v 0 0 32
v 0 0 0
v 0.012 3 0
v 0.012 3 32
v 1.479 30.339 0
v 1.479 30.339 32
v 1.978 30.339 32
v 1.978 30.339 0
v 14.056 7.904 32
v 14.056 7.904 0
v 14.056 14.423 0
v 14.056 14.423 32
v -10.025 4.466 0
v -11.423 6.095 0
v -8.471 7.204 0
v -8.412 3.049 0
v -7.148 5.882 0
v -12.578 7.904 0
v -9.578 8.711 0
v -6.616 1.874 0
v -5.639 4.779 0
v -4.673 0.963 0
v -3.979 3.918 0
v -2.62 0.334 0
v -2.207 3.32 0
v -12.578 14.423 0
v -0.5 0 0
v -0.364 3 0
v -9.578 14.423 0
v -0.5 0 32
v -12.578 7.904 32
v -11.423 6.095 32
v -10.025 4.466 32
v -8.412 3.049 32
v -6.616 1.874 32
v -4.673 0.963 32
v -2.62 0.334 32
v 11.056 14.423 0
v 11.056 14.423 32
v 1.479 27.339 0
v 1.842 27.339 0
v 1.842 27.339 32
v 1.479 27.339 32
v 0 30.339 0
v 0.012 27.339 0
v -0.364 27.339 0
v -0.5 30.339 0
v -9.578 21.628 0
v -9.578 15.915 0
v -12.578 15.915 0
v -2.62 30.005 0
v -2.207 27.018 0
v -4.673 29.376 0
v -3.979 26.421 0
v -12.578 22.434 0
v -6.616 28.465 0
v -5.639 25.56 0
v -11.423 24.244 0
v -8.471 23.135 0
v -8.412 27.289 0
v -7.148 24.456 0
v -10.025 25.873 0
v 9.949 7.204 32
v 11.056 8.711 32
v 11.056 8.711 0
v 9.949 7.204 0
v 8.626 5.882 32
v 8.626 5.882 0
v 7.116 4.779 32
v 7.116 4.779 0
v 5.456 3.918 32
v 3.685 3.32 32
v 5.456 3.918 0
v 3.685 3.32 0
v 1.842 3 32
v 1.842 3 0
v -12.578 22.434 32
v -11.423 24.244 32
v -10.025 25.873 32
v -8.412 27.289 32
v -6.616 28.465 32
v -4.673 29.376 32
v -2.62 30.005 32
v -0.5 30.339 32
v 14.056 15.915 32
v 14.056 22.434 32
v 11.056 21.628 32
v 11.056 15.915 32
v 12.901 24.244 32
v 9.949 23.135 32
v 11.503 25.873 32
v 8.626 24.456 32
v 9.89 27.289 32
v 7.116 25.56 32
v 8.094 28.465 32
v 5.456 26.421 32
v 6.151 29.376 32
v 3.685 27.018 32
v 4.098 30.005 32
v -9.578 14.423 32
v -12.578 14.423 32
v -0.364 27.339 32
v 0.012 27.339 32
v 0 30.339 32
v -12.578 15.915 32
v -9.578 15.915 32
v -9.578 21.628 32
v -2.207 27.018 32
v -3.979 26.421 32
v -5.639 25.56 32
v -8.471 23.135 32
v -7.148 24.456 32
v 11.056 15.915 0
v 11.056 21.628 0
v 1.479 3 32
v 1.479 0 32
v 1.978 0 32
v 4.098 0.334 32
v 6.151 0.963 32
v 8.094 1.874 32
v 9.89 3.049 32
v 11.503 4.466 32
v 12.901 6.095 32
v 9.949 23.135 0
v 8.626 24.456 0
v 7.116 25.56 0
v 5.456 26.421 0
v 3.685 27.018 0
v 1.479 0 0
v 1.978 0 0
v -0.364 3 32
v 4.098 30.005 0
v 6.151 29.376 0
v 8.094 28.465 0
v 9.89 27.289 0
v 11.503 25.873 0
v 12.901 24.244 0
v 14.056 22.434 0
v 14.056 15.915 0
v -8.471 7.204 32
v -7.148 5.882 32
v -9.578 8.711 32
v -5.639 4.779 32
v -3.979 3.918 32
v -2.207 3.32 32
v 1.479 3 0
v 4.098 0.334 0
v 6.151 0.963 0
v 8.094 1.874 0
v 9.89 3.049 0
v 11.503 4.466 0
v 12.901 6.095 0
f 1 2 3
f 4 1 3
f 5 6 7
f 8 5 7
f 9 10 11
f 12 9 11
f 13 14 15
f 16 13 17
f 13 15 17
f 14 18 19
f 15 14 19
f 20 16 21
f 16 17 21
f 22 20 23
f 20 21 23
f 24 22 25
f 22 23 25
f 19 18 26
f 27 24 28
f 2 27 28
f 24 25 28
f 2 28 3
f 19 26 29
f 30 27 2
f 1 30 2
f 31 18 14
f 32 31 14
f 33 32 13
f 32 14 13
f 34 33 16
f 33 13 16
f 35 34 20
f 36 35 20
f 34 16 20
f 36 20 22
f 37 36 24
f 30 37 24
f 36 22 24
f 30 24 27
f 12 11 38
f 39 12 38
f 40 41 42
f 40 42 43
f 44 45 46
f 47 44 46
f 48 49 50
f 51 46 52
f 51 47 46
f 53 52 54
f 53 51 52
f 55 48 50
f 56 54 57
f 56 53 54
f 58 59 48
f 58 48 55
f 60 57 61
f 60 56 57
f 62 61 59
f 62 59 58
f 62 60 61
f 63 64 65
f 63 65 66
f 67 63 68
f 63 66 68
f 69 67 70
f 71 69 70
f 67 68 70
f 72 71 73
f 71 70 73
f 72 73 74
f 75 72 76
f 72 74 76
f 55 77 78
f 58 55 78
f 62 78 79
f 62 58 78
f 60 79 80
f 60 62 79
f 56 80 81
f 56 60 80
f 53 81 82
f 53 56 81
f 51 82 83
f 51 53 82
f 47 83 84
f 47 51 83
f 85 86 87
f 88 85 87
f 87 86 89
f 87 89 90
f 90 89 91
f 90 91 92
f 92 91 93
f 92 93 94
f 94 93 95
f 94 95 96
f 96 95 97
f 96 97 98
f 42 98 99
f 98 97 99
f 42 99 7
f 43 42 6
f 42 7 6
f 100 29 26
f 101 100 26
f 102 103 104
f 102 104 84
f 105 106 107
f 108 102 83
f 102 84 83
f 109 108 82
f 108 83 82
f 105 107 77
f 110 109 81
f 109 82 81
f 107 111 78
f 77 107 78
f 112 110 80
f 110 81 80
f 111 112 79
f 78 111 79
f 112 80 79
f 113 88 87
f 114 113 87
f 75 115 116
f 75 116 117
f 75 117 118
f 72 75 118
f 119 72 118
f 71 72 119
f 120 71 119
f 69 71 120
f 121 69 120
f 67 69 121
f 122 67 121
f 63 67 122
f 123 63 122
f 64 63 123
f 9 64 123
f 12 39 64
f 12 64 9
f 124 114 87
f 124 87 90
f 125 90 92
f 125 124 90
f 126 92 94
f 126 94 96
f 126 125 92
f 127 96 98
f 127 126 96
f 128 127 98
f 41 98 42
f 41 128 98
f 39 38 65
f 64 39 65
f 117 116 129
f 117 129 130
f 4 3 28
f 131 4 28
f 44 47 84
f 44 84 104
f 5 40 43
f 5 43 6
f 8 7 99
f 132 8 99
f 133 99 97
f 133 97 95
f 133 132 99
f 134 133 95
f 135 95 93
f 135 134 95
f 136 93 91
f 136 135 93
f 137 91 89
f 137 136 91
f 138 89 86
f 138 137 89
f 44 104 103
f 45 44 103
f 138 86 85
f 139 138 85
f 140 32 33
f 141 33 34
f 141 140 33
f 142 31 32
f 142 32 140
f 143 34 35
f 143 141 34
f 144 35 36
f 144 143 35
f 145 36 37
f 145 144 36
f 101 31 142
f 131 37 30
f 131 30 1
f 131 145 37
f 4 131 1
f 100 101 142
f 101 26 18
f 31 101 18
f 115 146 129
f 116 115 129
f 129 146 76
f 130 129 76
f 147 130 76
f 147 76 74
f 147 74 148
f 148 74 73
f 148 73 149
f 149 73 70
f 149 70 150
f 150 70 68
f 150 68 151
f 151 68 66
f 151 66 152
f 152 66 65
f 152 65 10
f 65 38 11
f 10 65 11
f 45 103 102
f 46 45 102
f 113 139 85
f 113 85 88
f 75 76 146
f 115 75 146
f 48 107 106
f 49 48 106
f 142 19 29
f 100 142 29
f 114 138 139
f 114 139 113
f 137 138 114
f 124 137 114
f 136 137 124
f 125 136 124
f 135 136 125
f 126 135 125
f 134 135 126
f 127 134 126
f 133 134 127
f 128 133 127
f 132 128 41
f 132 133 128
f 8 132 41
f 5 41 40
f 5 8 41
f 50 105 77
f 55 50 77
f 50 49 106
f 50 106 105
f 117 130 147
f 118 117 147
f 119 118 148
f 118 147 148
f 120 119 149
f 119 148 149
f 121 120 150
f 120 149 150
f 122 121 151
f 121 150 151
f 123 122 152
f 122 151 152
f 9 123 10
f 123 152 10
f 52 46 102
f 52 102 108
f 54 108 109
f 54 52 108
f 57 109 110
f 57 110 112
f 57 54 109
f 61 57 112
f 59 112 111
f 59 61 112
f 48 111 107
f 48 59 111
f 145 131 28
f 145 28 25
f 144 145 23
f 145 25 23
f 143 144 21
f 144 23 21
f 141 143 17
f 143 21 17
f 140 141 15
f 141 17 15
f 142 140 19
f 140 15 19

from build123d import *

# Parameters (mm, degrees)
BOSS_EXTRUDE1_DEPTH   = 32
BOSS_EXTRUDE1_2_DEPTH = 32
BOSS_EXTRUDE1_3_DEPTH = 32
BOSS_EXTRUDE1_4_DEPTH = 32


with BuildPart() as part:
    # Sketch1 → Boss-Extrude1 (new body)
    with BuildSketch(Plane.XY):
        with BuildLine():
            Line((11.055504192, 15.915227729), (11.055504192, 21.627656226))
            ThreePointArc((11.055504192, 21.627656226), (7.11644699, 25.56014018), (1.842224397, 27.338672642))
            Line((1.842224397, 27.338672642), (1.478906991, 27.338672642))
            Line((1.478906991, 27.338672642), (1.478906991, 30.338672642))
            Line((1.478906991, 30.338672642), (1.977816066, 30.338672642))
            ThreePointArc((1.977816066, 30.338672642), (9.01290626, 27.908773043), (14.055504192, 22.43436785))
            Line((14.055504192, 22.43436785), (14.055504192, 15.915227729))
            Line((14.055504192, 15.915227729), (11.055504192, 15.915227729))
        make_face()
    extrude(amount=BOSS_EXTRUDE1_DEPTH)


with BuildPart() as body_2:
    # Sketch1 → Boss-Extrude1 2 (new body)
    with BuildSketch(Plane.XY):
        with BuildLine():
            Line((0, 0), (0.012301558, 3))
            Line((0.012301558, 3), (-0.364412535, 3))
            ThreePointArc((-0.364412535, 3), (-5.638635128, 4.778532462), (-9.57769233, 8.711016416))
            Line((-9.57769233, 8.711016416), (-9.57769233, 14.423444914))
            Line((-9.57769233, 14.423444914), (-12.57769233, 14.423444914))
            Line((-12.57769233, 14.423444914), (-12.57769233, 7.904304792))
            ThreePointArc((-12.57769233, 7.904304792), (-7.535094399, 2.4298996), (-0.500004204, 0))
            Line((-0.500004204, 0), (0, 0))
        make_face()
    extrude(amount=BOSS_EXTRUDE1_2_DEPTH)


with BuildPart() as body_3:
    # Sketch1 → Boss-Extrude1 3 (new body)
    with BuildSketch(Plane.XY):
        with BuildLine():
            Line((0, 30.338672642), (0.012301765, 27.338672642))
            Line((0.012301765, 27.338672642), (-0.364412535, 27.338672642))
            ThreePointArc((-0.364412535, 27.338672642), (-5.638635128, 25.56014018), (-9.57769233, 21.627656226))
            Line((-9.57769233, 21.627656226), (-9.57769233, 15.915227729))
            Line((-9.57769233, 15.915227729), (-12.57769233, 15.915227729))
            Line((-12.57769233, 15.915227729), (-12.57769233, 22.43436785))
            ThreePointArc((-12.57769233, 22.43436785), (-7.535094399, 27.908773043), (-0.500004204, 30.338672642))
            Line((-0.500004204, 30.338672642), (0, 30.338672642))
        make_face()
    extrude(amount=BOSS_EXTRUDE1_3_DEPTH)


with BuildPart() as body_4:
    # Sketch1 → Boss-Extrude1 4 (new body)
    with BuildSketch(Plane.XY):
        with BuildLine():
            Line((14.055504192, 7.904304792), (14.055504192, 14.423444914))
            Line((14.055504192, 14.423444914), (11.055504192, 14.423444914))
            Line((11.055504192, 14.423444914), (11.055504192, 8.711016416))
            ThreePointArc((11.055504192, 8.711016416), (7.11644699, 4.778532462), (1.842224397, 3))
            Line((1.842224397, 3), (1.478906991, 3))
            Line((1.478906991, 3), (1.478906991, 0))
            Line((1.478906991, 0), (1.977816066, 0))
            ThreePointArc((1.977816066, 0), (9.01290626, 2.4298996), (14.055504192, 7.904304792))
        make_face()
    extrude(amount=BOSS_EXTRUDE1_4_DEPTH)


solid = Compound([part.part, body_2.part, body_3.part, body_4.part])
